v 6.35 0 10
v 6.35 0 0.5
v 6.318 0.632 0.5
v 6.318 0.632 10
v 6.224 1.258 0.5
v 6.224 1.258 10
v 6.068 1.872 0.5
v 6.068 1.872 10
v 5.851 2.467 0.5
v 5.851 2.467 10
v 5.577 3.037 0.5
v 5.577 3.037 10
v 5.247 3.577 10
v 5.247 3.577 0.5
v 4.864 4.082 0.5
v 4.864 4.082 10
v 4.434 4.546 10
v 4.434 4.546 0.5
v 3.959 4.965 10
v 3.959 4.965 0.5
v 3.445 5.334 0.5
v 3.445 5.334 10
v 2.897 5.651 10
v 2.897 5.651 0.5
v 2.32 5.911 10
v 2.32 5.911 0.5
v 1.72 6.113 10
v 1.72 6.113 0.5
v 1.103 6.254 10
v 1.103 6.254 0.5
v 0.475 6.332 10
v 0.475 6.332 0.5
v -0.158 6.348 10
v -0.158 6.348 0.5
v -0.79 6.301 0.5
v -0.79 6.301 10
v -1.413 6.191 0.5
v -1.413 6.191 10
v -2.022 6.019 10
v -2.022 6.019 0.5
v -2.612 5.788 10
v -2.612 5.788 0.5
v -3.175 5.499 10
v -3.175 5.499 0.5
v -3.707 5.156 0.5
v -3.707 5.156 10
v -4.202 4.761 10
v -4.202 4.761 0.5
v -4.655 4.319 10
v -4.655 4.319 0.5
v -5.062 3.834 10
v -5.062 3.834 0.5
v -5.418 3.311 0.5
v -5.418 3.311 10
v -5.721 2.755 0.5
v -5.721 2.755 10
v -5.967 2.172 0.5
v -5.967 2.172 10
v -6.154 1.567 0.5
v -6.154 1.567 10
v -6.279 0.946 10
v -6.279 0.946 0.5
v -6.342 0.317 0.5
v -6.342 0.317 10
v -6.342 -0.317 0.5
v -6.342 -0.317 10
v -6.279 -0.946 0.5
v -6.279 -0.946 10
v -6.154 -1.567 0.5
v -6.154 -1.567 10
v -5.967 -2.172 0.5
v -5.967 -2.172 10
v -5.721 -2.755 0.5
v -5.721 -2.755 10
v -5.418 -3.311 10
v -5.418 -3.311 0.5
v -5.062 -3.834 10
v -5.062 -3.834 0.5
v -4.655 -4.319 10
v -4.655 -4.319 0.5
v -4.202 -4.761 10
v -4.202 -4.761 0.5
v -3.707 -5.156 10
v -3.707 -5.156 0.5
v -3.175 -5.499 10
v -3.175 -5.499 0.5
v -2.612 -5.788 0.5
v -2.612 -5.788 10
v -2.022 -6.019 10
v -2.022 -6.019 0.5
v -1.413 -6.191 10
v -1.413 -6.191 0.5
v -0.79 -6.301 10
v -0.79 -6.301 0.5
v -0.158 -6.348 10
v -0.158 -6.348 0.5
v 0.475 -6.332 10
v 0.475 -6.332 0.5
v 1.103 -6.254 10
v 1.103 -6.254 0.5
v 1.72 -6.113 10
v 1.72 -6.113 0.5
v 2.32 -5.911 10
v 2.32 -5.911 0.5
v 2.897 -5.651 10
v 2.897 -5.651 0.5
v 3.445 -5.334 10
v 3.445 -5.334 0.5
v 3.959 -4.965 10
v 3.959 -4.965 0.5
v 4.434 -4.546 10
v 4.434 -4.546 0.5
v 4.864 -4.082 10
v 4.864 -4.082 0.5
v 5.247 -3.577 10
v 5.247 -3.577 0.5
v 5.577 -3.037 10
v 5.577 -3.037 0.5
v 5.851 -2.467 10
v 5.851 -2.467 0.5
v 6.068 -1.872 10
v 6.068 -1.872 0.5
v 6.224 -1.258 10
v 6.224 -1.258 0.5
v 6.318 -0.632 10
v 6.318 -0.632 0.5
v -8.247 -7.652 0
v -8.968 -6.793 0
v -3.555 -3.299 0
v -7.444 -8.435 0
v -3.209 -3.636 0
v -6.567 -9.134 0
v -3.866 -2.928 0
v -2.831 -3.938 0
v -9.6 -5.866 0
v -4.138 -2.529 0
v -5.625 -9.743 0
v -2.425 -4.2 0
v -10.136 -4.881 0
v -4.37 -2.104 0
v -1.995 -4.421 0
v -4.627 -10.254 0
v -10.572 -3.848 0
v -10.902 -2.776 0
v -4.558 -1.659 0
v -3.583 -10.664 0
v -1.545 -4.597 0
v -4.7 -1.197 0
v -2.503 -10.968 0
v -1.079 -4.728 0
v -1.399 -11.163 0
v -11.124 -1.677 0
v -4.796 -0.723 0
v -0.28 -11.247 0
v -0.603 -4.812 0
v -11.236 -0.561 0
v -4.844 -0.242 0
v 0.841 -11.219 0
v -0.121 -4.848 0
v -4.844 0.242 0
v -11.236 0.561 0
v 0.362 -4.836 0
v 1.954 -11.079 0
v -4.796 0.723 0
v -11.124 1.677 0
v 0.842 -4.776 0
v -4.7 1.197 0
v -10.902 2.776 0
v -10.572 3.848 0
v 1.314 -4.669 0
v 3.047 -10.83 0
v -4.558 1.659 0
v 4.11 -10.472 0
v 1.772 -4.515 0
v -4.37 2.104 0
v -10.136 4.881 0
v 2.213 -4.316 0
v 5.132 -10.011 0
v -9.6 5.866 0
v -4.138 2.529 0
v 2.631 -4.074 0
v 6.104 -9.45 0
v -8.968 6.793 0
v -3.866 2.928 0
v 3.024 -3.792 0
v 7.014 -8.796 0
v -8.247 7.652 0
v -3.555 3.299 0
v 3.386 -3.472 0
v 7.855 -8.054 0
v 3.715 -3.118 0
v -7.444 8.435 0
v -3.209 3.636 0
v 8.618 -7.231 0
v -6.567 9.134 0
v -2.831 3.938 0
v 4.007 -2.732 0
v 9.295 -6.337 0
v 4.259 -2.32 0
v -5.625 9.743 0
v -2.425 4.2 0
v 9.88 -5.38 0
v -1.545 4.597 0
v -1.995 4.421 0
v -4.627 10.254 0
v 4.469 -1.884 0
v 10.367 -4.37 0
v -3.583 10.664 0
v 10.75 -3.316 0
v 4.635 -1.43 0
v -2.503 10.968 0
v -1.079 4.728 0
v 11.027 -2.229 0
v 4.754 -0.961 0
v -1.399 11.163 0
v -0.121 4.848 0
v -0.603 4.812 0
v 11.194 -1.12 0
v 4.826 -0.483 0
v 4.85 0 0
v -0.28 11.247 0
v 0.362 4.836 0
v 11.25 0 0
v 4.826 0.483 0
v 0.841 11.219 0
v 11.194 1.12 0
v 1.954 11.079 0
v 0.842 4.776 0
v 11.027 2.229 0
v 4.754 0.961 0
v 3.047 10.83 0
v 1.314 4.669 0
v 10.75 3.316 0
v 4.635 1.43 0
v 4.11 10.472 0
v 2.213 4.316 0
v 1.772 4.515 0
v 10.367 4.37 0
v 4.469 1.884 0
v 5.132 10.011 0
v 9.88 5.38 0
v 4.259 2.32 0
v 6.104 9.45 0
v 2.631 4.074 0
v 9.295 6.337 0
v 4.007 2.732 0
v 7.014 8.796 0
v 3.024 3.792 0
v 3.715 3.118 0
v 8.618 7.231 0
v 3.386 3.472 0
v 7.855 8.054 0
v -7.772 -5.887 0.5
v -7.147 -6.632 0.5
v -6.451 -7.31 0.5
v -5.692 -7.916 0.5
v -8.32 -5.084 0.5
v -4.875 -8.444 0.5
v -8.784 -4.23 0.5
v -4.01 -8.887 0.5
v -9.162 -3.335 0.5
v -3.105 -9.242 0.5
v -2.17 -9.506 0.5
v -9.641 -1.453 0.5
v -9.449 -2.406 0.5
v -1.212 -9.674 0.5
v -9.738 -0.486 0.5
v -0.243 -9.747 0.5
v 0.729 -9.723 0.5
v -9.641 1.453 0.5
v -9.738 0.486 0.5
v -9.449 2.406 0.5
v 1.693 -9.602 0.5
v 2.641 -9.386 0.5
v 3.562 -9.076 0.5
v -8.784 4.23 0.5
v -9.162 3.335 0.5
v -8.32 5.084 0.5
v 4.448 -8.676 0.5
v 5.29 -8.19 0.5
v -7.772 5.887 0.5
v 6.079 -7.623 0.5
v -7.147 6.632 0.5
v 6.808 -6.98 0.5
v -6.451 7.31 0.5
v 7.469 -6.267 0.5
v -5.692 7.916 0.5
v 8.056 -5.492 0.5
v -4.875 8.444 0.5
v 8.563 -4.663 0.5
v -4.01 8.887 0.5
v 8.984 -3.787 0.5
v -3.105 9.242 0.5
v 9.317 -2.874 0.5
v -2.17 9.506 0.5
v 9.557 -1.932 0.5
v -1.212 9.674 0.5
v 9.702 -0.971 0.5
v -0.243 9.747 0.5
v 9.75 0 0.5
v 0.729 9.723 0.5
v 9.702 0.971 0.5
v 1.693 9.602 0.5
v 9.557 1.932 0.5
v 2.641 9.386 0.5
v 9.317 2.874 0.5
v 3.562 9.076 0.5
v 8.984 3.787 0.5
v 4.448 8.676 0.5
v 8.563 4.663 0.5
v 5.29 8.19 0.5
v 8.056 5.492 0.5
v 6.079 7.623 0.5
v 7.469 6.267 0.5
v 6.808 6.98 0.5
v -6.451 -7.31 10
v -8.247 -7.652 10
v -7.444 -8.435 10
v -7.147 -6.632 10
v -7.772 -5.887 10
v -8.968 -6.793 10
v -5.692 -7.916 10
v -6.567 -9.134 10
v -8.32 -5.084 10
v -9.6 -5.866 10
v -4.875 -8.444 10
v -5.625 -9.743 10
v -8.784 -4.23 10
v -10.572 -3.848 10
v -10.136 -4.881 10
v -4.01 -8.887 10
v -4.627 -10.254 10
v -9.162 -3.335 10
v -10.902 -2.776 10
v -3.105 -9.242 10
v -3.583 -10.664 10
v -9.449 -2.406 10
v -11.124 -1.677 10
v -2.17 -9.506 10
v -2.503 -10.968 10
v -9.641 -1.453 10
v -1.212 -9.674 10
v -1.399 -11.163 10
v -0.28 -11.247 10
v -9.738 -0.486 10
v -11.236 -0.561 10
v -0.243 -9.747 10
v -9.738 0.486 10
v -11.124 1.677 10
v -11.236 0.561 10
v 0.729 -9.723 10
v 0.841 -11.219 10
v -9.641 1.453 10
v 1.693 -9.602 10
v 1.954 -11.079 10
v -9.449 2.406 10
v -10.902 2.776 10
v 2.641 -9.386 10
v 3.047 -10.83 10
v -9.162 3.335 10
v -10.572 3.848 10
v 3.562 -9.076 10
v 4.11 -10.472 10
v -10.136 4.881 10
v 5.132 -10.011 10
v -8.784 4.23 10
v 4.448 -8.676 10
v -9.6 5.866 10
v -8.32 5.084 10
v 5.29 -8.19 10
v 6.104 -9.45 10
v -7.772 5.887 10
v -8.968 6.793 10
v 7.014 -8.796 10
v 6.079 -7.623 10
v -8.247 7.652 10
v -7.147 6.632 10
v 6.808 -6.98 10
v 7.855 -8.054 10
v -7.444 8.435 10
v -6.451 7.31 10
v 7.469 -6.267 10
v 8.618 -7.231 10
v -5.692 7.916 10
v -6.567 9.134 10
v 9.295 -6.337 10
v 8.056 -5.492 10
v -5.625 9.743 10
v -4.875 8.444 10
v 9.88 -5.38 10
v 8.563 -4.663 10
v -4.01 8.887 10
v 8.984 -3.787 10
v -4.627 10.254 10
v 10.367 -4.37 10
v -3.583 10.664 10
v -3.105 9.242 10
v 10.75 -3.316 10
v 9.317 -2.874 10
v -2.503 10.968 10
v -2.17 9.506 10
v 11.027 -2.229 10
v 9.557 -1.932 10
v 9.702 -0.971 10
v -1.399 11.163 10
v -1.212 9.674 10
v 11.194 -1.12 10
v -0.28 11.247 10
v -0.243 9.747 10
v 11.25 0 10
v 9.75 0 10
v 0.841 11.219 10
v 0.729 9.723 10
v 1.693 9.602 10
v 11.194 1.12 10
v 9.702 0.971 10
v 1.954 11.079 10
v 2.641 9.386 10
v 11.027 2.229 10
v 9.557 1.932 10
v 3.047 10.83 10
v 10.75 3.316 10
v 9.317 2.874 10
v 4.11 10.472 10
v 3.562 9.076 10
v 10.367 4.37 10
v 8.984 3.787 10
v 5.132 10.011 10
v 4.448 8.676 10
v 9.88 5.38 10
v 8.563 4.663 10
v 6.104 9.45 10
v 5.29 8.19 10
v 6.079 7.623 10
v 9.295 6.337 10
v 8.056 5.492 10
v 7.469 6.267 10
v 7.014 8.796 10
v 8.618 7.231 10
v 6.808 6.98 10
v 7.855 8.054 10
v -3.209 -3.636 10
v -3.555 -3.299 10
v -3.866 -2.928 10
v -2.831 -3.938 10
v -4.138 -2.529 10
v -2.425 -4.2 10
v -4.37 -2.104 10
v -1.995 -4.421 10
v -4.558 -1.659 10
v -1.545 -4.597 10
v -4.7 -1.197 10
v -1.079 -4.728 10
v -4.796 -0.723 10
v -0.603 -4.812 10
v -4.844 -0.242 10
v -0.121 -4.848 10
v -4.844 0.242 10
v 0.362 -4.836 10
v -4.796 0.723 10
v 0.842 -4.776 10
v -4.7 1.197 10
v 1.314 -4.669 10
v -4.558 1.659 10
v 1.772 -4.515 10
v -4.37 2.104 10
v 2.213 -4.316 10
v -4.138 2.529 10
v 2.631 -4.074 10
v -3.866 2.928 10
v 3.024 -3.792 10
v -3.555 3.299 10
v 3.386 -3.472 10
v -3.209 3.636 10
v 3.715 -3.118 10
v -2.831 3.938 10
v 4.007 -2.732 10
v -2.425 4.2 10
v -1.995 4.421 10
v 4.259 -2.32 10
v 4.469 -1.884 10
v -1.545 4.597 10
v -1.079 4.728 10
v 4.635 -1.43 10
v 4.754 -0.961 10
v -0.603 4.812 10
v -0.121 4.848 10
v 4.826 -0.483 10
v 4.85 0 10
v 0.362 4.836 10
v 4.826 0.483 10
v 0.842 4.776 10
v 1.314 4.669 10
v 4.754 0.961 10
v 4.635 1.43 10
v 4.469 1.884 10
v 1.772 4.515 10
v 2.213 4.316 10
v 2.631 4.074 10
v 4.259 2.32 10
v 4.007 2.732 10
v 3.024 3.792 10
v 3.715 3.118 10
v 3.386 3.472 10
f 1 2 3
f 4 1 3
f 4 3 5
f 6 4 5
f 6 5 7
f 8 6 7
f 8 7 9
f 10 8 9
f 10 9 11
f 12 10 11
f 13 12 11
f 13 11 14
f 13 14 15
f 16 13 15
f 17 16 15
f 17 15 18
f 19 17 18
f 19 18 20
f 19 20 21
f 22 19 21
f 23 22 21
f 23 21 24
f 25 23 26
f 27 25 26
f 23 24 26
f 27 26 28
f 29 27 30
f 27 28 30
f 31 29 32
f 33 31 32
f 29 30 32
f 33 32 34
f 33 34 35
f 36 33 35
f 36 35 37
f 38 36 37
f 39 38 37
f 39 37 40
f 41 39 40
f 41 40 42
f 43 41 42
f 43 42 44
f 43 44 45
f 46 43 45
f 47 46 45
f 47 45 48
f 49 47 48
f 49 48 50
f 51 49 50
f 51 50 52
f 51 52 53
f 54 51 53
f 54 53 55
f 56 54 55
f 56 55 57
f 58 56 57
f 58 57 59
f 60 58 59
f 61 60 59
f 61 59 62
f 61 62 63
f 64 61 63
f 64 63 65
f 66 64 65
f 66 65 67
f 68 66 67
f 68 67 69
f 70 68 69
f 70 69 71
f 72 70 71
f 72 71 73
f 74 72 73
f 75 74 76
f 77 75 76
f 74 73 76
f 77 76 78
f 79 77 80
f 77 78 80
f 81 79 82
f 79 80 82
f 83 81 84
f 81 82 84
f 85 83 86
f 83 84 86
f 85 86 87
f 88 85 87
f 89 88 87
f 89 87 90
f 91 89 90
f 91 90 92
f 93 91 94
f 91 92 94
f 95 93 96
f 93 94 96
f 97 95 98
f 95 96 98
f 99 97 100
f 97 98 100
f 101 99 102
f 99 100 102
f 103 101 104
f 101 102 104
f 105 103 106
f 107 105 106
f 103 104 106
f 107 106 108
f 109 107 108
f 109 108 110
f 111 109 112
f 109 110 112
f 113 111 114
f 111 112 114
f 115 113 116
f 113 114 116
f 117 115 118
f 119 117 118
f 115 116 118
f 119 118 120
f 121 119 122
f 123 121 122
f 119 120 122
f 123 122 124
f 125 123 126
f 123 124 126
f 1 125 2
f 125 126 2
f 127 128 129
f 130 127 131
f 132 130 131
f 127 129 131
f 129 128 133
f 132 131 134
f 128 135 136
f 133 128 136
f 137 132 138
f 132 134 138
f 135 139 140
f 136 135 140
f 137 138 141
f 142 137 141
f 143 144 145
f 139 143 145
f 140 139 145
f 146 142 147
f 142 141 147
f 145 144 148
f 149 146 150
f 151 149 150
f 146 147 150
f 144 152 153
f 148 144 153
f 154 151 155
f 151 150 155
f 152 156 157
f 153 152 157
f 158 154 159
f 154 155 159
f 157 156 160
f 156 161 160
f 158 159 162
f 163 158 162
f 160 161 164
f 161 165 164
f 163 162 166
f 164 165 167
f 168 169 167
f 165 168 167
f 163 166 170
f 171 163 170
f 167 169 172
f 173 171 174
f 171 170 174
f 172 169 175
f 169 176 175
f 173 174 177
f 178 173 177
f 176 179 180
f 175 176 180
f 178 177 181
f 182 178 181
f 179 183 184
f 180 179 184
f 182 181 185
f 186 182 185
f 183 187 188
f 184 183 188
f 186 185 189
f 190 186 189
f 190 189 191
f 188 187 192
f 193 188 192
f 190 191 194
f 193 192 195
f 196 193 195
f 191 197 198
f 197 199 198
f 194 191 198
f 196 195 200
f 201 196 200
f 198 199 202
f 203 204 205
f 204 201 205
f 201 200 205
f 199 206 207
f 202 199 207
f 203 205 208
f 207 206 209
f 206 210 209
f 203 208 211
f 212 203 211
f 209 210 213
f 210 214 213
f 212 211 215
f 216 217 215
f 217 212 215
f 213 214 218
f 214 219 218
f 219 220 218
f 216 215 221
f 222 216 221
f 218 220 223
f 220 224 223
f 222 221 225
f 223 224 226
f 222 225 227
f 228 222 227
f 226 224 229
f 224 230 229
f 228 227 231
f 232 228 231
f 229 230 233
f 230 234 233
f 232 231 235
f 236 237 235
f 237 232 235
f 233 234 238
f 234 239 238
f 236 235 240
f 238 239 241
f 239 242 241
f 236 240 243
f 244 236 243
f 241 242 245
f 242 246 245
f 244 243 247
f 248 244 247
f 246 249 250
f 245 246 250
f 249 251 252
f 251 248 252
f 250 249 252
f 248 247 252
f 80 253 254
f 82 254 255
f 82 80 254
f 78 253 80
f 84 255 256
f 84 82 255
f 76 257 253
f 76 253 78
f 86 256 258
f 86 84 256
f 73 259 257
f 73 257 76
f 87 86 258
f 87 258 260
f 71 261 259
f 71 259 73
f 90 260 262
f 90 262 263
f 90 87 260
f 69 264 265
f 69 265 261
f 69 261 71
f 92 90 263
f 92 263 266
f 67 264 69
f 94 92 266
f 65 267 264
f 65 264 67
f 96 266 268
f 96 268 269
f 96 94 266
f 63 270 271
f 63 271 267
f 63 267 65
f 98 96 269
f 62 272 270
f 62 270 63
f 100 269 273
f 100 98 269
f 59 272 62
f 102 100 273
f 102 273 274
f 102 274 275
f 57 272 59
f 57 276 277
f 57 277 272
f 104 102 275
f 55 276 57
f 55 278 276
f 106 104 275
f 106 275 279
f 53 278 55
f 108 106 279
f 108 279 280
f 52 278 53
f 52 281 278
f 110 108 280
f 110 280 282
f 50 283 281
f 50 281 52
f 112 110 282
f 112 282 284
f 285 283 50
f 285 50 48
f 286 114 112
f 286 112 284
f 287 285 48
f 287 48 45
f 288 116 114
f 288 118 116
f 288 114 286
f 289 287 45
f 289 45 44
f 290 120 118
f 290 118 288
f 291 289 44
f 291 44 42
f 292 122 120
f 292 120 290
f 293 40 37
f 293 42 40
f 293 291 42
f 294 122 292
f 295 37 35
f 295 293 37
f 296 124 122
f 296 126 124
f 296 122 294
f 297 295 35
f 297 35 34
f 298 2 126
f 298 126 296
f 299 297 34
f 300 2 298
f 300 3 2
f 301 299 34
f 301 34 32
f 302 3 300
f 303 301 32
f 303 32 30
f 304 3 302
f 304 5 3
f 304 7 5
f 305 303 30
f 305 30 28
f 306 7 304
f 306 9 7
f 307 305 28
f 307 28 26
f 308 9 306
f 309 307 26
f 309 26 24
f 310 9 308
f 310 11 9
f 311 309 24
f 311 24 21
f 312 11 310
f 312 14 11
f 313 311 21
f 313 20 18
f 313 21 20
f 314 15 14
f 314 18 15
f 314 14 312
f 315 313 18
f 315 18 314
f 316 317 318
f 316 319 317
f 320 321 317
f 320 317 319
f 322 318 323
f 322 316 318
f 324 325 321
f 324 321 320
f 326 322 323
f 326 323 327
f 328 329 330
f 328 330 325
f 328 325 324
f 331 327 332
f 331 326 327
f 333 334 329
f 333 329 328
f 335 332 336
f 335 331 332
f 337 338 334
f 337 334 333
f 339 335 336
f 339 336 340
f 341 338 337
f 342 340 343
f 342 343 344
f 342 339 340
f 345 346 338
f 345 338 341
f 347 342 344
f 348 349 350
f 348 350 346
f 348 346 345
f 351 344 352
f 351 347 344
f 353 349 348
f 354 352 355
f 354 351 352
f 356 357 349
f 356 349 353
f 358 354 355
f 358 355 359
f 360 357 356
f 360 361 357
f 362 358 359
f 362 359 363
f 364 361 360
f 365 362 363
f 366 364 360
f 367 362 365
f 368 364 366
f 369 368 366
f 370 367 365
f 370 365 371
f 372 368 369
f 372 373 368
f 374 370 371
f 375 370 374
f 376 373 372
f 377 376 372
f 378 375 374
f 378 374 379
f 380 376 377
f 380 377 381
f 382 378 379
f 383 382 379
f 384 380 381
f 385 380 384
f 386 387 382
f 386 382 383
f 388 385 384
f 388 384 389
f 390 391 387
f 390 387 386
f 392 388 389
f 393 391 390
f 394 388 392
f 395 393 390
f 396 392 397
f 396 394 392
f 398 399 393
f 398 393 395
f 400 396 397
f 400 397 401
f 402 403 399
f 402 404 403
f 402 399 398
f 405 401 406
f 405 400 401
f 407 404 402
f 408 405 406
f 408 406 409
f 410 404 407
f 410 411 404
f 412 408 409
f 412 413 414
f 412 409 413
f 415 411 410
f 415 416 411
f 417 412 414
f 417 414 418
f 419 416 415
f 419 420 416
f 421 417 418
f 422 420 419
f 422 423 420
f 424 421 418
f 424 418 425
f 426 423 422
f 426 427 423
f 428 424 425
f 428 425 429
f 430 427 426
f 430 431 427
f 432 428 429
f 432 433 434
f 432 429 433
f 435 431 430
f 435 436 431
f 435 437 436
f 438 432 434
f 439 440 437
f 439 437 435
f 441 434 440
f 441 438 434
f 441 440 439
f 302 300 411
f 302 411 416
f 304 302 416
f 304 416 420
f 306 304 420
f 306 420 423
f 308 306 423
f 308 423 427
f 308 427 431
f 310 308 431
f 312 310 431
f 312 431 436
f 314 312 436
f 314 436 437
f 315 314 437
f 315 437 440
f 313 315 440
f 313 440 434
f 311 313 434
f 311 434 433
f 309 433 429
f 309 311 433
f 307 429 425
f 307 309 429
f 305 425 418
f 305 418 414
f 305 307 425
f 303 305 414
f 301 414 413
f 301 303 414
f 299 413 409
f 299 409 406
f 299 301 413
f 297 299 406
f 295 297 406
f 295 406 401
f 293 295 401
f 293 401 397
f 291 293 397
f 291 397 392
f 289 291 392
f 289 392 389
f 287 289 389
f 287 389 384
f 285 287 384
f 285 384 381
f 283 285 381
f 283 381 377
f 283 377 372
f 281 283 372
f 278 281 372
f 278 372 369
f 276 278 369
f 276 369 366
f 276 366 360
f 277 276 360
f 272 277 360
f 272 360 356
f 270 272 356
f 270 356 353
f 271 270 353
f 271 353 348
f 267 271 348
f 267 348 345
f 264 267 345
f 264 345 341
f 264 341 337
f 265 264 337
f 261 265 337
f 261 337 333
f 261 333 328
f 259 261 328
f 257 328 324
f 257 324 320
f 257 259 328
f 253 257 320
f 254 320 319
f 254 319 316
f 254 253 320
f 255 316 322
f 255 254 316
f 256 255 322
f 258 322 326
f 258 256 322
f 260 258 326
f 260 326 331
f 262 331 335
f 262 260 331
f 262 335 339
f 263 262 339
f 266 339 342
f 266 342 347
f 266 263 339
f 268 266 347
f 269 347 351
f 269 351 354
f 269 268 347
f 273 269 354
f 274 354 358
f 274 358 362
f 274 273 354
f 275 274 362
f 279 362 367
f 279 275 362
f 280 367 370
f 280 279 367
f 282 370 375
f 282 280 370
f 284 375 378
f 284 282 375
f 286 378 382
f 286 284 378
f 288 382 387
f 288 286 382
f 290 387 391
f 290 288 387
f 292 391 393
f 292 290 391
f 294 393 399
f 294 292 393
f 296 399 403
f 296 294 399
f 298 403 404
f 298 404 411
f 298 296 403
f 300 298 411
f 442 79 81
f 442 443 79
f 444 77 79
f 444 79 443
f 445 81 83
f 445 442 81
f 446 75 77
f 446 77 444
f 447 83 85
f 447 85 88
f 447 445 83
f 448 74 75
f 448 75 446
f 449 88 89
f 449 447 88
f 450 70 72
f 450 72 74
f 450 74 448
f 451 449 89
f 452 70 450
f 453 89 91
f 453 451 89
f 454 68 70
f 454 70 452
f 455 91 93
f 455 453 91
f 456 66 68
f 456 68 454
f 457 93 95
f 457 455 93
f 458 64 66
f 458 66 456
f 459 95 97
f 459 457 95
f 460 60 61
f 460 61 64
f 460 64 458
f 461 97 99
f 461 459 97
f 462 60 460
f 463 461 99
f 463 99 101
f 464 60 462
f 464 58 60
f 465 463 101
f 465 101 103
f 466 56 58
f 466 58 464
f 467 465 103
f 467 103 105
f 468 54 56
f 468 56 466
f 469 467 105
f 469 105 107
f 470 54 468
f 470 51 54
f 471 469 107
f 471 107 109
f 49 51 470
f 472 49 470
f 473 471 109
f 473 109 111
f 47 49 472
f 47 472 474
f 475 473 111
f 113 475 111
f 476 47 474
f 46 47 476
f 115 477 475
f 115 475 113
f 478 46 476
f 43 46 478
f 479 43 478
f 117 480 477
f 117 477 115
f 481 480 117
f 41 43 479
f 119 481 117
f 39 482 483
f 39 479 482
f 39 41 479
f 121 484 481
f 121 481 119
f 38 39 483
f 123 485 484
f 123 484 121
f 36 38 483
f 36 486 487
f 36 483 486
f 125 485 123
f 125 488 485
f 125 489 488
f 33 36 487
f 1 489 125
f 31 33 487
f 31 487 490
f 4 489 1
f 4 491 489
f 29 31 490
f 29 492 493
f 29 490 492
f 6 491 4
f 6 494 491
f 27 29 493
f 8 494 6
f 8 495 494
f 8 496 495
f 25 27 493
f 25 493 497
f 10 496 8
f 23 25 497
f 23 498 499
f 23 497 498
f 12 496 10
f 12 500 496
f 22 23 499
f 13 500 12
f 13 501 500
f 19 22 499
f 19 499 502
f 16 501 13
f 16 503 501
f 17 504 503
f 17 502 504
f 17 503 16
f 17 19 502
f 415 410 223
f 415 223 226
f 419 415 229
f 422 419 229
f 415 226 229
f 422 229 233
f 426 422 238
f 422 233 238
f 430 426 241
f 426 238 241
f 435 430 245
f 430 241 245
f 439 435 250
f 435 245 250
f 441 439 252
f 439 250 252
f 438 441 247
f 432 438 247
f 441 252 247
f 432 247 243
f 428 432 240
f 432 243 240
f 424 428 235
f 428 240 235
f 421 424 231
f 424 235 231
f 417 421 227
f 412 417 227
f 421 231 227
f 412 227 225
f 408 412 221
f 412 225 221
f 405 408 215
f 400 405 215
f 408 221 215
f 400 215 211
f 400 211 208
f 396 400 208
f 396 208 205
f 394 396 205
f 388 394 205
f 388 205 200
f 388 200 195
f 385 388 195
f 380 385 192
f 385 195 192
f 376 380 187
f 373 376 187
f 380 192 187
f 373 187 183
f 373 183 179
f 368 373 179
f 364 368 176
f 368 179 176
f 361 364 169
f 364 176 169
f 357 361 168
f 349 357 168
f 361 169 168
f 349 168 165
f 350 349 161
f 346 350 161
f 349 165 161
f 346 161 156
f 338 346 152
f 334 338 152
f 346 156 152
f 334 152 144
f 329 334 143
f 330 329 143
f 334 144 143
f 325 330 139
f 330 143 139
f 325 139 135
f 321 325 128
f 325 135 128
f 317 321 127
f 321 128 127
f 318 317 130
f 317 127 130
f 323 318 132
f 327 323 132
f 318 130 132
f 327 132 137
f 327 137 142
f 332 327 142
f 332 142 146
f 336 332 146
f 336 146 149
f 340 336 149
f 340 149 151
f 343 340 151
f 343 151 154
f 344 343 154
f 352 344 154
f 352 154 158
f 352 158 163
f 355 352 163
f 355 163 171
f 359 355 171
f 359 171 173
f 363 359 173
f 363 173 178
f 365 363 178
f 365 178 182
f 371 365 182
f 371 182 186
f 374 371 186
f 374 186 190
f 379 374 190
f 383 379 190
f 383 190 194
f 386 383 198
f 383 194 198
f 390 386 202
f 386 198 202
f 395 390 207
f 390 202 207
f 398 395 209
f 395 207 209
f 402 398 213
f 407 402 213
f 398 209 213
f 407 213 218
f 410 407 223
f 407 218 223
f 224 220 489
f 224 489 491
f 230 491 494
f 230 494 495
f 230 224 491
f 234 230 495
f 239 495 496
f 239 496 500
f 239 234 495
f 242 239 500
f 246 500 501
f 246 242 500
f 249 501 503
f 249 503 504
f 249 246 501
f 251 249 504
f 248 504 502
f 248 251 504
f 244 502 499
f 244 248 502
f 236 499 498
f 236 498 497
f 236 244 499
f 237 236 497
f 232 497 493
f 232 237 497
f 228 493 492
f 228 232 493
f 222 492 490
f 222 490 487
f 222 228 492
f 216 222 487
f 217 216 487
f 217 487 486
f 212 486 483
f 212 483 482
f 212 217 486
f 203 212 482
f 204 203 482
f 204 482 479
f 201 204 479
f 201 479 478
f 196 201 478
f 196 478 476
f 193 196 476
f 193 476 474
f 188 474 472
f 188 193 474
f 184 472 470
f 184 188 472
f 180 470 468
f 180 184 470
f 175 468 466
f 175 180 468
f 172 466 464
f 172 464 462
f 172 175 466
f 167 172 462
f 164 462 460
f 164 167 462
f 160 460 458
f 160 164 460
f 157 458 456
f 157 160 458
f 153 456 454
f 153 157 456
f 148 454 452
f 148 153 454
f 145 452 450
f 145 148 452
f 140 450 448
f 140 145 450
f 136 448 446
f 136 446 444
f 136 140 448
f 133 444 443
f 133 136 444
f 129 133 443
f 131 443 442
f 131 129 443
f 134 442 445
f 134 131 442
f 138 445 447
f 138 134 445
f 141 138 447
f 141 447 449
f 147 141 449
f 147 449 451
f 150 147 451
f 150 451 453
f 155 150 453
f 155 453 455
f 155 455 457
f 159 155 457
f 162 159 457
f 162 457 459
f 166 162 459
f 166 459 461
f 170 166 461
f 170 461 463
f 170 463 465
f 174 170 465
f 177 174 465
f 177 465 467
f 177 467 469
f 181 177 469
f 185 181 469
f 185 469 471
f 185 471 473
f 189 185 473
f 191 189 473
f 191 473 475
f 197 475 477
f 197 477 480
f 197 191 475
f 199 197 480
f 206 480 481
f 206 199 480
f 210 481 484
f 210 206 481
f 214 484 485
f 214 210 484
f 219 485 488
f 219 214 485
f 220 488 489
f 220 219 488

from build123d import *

# Parameters (mm, degrees)
F0_R     = 11.25
F0_R_2   = 9.75
F1_DEPTH = 10
F0_R_3   = 6.35
F0_R_4   = 4.8500001431
F2_DEPTH = 0.5


with BuildPart() as f1:
    # F0 (on Top) → F1 (new body)
    with BuildSketch(Plane.XY):
        Circle(F0_R)
        Circle(F0_R_2, mode=Mode.SUBTRACT)
    extrude(amount=F1_DEPTH)



with BuildPart() as f1b:
    # F0 (on Top) → F1, piece 2 (new body)
    with BuildSketch(Plane.XY):
        Circle(F0_R_3)
        Circle(F0_R_4, mode=Mode.SUBTRACT)
    extrude(amount=F1_DEPTH)


with BuildPart() as f1_1:
    add(f1.part)

    add(f1b.part)  # F2 merges F1b
    # F0 (on Top) → F2 (join)
    with BuildSketch(Plane.XY):
        Circle(F0_R_2)
        Circle(F0_R_3, mode=Mode.SUBTRACT)
    extrude(amount=F2_DEPTH)


solid = f1_1.part
